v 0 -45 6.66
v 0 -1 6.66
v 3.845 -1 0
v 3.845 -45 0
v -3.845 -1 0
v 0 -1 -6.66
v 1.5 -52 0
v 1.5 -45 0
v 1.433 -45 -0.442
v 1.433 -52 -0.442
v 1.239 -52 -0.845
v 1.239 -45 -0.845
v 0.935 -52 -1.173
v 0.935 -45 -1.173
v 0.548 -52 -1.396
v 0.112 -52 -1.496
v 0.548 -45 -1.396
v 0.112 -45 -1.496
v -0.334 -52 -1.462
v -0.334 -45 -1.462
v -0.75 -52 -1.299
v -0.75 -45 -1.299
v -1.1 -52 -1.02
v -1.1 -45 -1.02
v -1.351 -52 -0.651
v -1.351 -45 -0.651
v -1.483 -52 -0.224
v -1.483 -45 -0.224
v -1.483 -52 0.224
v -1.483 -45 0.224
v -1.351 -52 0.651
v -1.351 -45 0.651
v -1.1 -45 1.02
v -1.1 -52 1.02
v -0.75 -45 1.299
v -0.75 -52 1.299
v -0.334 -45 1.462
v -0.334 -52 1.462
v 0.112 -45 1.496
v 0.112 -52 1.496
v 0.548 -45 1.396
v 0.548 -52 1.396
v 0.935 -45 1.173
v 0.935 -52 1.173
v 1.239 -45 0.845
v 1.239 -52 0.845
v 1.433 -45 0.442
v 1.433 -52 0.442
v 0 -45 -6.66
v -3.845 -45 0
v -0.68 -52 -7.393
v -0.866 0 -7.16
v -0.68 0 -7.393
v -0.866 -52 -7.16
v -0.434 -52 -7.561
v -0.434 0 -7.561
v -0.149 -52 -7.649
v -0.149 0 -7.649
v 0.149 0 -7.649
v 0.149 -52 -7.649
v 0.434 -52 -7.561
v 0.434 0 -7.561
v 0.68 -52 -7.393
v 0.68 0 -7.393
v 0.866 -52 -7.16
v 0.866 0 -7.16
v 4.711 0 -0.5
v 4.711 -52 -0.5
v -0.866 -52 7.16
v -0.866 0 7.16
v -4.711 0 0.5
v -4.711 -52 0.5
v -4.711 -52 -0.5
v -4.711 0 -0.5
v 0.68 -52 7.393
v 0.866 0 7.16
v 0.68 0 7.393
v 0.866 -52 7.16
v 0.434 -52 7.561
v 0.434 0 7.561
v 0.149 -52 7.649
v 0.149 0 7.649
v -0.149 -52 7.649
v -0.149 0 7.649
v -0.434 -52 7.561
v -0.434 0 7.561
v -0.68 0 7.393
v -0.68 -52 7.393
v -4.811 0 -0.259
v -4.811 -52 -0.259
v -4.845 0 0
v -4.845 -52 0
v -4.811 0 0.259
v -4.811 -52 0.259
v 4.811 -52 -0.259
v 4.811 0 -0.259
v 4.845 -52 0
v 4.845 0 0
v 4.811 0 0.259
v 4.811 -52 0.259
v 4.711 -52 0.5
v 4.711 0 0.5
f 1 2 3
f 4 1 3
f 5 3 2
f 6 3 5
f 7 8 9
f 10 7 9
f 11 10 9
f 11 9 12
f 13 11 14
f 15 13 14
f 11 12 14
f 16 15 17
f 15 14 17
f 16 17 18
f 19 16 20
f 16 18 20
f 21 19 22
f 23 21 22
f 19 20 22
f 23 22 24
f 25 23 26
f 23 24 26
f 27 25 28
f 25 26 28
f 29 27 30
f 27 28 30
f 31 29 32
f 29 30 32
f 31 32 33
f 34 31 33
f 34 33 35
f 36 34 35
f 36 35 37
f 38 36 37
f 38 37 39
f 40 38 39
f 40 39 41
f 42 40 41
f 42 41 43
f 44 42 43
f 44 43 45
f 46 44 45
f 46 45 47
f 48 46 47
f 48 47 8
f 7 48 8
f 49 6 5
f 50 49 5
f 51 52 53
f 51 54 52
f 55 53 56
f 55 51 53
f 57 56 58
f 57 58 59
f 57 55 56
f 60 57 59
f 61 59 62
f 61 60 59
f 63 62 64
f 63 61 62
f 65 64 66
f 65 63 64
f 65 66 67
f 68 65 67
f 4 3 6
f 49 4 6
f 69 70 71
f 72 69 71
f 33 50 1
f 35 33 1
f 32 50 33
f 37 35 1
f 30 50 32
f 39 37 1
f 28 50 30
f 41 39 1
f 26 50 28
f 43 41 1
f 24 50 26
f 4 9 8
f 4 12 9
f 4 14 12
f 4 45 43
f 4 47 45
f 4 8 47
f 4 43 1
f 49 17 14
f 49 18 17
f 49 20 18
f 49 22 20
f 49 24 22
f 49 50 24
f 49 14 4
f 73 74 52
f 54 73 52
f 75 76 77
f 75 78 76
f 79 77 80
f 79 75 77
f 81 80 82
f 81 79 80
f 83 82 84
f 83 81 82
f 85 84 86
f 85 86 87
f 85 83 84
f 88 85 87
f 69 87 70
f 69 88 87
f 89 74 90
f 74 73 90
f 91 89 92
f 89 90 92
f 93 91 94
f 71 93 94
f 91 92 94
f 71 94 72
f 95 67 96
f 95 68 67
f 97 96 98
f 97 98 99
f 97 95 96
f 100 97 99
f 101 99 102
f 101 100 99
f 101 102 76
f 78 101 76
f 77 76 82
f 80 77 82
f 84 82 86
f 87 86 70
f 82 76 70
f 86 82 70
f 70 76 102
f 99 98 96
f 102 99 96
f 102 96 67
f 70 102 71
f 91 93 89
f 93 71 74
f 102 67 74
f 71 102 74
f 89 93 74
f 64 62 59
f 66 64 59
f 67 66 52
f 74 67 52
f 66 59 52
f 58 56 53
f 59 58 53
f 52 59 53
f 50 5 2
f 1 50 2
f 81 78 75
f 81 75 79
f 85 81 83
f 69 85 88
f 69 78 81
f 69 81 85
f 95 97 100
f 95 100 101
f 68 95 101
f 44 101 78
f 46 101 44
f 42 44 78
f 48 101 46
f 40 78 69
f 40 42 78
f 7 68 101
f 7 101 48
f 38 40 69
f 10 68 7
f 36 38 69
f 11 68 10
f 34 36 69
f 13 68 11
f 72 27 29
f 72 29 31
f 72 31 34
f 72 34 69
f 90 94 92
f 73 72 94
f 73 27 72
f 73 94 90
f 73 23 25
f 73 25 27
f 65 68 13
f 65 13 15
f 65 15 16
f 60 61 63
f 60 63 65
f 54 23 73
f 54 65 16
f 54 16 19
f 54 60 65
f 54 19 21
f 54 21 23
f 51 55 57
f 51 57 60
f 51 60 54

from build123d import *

# Parameters (mm, degrees)
BOSS_EXTRUDE1_DEPTH = 52
CUT_EXTRUDE1_DEPTH  = 45
SKETCH3_R           = 1.5
CUT_EXTRUDE2_DEPTH  = 8
BOSS_EXTRUDE2_DEPTH = 1
CUT_EXTRUDE5_DEPTH  = 10
FILLET1_R           = 1


with BuildPart() as part:
    # Sketch1 → Boss-Extrude1 (new body)
    with BuildSketch(Plane(origin=(0, 0, 0), x_dir=(1, 0, 0), z_dir=(0, 1, 0))):
        Polygon((-5, 0), (0, 8.660254), (5, 0), (0, -8.660254), align=None)
    extrude(amount=-BOSS_EXTRUDE1_DEPTH)

    # Sketch2 → Cut-Extrude1 (cut)
    with BuildSketch(Plane(origin=(0, 0, 0), x_dir=(1, 0, 0), z_dir=(0, 1, 0))):
        Polygon((0, 6.660254), (-3.845299, 0), (0, -6.660254), (3.845299, 0), align=None)
    extrude(amount=-CUT_EXTRUDE1_DEPTH, mode=Mode.SUBTRACT)

    # Sketch3 → Cut-Extrude2 (cut, through all)
    with BuildSketch(Plane(origin=(0, -45, 0), x_dir=(1, 0, 0), z_dir=(0, 1, 0))):
        Circle(SKETCH3_R)
    extrude(amount=-CUT_EXTRUDE2_DEPTH, mode=Mode.SUBTRACT)

    # Sketch5 → Boss-Extrude2 (add)
    with BuildSketch(Plane(origin=(0, 0, 0), x_dir=(1, 0, 0), z_dir=(0, 1, 0))):
        Polygon((-3.845299, 0), (0, 6.660254), (3.845299, 0), (0, -6.660254), align=None)
    extrude(amount=-BOSS_EXTRUDE2_DEPTH)

    # Sketch12 → Cut-Extrude5 (cut)
    with BuildSketch(Plane.XZ.offset(52)):
        with BuildLine():
            Line((-0.866025, 7.160254), (0, 8.660254))
            Line((0, 8.660254), (0.866025, 7.160254))
            ThreePointArc((0.866025, 7.160254), (0, 7.660254), (-0.866025, 7.160254))
        make_face()
        with BuildLine():
            Line((-4.711325, 0.5), (-5, 0))
            Line((-5, 0), (-4.711325, -0.5))
            ThreePointArc((-4.711325, -0.5), (-4.845299, 0), (-4.711325, 0.5))
        make_face()
        with BuildLine():
            Line((-0.866025, -7.160254), (0, -8.660254))
            Line((0, -8.660254), (0.866025, -7.160254))
            ThreePointArc((0.866025, -7.160254), (0, -7.660254), (-0.866025, -7.160254))
        make_face()
        with BuildLine():
            Line((4.711325, 0.5), (5, 0))
            Line((5, 0), (4.711325, -0.5))
            ThreePointArc((4.711325, -0.5), (4.845299, 0), (4.711325, 0.5))
        make_face()
    extrude(amount=-CUT_EXTRUDE5_DEPTH, mode=Mode.SUBTRACT)

    # Fillet1
    fillet1_edges = [part.edges().sort_by_distance(p)[0] for p in [
        (-5, -21, 0),
        (0, -21, 8.660254),
        (5, -21, 0),
        (0, -21, -8.660254),
    ]]
    fillet(fillet1_edges, radius=FILLET1_R)


solid = part.part
